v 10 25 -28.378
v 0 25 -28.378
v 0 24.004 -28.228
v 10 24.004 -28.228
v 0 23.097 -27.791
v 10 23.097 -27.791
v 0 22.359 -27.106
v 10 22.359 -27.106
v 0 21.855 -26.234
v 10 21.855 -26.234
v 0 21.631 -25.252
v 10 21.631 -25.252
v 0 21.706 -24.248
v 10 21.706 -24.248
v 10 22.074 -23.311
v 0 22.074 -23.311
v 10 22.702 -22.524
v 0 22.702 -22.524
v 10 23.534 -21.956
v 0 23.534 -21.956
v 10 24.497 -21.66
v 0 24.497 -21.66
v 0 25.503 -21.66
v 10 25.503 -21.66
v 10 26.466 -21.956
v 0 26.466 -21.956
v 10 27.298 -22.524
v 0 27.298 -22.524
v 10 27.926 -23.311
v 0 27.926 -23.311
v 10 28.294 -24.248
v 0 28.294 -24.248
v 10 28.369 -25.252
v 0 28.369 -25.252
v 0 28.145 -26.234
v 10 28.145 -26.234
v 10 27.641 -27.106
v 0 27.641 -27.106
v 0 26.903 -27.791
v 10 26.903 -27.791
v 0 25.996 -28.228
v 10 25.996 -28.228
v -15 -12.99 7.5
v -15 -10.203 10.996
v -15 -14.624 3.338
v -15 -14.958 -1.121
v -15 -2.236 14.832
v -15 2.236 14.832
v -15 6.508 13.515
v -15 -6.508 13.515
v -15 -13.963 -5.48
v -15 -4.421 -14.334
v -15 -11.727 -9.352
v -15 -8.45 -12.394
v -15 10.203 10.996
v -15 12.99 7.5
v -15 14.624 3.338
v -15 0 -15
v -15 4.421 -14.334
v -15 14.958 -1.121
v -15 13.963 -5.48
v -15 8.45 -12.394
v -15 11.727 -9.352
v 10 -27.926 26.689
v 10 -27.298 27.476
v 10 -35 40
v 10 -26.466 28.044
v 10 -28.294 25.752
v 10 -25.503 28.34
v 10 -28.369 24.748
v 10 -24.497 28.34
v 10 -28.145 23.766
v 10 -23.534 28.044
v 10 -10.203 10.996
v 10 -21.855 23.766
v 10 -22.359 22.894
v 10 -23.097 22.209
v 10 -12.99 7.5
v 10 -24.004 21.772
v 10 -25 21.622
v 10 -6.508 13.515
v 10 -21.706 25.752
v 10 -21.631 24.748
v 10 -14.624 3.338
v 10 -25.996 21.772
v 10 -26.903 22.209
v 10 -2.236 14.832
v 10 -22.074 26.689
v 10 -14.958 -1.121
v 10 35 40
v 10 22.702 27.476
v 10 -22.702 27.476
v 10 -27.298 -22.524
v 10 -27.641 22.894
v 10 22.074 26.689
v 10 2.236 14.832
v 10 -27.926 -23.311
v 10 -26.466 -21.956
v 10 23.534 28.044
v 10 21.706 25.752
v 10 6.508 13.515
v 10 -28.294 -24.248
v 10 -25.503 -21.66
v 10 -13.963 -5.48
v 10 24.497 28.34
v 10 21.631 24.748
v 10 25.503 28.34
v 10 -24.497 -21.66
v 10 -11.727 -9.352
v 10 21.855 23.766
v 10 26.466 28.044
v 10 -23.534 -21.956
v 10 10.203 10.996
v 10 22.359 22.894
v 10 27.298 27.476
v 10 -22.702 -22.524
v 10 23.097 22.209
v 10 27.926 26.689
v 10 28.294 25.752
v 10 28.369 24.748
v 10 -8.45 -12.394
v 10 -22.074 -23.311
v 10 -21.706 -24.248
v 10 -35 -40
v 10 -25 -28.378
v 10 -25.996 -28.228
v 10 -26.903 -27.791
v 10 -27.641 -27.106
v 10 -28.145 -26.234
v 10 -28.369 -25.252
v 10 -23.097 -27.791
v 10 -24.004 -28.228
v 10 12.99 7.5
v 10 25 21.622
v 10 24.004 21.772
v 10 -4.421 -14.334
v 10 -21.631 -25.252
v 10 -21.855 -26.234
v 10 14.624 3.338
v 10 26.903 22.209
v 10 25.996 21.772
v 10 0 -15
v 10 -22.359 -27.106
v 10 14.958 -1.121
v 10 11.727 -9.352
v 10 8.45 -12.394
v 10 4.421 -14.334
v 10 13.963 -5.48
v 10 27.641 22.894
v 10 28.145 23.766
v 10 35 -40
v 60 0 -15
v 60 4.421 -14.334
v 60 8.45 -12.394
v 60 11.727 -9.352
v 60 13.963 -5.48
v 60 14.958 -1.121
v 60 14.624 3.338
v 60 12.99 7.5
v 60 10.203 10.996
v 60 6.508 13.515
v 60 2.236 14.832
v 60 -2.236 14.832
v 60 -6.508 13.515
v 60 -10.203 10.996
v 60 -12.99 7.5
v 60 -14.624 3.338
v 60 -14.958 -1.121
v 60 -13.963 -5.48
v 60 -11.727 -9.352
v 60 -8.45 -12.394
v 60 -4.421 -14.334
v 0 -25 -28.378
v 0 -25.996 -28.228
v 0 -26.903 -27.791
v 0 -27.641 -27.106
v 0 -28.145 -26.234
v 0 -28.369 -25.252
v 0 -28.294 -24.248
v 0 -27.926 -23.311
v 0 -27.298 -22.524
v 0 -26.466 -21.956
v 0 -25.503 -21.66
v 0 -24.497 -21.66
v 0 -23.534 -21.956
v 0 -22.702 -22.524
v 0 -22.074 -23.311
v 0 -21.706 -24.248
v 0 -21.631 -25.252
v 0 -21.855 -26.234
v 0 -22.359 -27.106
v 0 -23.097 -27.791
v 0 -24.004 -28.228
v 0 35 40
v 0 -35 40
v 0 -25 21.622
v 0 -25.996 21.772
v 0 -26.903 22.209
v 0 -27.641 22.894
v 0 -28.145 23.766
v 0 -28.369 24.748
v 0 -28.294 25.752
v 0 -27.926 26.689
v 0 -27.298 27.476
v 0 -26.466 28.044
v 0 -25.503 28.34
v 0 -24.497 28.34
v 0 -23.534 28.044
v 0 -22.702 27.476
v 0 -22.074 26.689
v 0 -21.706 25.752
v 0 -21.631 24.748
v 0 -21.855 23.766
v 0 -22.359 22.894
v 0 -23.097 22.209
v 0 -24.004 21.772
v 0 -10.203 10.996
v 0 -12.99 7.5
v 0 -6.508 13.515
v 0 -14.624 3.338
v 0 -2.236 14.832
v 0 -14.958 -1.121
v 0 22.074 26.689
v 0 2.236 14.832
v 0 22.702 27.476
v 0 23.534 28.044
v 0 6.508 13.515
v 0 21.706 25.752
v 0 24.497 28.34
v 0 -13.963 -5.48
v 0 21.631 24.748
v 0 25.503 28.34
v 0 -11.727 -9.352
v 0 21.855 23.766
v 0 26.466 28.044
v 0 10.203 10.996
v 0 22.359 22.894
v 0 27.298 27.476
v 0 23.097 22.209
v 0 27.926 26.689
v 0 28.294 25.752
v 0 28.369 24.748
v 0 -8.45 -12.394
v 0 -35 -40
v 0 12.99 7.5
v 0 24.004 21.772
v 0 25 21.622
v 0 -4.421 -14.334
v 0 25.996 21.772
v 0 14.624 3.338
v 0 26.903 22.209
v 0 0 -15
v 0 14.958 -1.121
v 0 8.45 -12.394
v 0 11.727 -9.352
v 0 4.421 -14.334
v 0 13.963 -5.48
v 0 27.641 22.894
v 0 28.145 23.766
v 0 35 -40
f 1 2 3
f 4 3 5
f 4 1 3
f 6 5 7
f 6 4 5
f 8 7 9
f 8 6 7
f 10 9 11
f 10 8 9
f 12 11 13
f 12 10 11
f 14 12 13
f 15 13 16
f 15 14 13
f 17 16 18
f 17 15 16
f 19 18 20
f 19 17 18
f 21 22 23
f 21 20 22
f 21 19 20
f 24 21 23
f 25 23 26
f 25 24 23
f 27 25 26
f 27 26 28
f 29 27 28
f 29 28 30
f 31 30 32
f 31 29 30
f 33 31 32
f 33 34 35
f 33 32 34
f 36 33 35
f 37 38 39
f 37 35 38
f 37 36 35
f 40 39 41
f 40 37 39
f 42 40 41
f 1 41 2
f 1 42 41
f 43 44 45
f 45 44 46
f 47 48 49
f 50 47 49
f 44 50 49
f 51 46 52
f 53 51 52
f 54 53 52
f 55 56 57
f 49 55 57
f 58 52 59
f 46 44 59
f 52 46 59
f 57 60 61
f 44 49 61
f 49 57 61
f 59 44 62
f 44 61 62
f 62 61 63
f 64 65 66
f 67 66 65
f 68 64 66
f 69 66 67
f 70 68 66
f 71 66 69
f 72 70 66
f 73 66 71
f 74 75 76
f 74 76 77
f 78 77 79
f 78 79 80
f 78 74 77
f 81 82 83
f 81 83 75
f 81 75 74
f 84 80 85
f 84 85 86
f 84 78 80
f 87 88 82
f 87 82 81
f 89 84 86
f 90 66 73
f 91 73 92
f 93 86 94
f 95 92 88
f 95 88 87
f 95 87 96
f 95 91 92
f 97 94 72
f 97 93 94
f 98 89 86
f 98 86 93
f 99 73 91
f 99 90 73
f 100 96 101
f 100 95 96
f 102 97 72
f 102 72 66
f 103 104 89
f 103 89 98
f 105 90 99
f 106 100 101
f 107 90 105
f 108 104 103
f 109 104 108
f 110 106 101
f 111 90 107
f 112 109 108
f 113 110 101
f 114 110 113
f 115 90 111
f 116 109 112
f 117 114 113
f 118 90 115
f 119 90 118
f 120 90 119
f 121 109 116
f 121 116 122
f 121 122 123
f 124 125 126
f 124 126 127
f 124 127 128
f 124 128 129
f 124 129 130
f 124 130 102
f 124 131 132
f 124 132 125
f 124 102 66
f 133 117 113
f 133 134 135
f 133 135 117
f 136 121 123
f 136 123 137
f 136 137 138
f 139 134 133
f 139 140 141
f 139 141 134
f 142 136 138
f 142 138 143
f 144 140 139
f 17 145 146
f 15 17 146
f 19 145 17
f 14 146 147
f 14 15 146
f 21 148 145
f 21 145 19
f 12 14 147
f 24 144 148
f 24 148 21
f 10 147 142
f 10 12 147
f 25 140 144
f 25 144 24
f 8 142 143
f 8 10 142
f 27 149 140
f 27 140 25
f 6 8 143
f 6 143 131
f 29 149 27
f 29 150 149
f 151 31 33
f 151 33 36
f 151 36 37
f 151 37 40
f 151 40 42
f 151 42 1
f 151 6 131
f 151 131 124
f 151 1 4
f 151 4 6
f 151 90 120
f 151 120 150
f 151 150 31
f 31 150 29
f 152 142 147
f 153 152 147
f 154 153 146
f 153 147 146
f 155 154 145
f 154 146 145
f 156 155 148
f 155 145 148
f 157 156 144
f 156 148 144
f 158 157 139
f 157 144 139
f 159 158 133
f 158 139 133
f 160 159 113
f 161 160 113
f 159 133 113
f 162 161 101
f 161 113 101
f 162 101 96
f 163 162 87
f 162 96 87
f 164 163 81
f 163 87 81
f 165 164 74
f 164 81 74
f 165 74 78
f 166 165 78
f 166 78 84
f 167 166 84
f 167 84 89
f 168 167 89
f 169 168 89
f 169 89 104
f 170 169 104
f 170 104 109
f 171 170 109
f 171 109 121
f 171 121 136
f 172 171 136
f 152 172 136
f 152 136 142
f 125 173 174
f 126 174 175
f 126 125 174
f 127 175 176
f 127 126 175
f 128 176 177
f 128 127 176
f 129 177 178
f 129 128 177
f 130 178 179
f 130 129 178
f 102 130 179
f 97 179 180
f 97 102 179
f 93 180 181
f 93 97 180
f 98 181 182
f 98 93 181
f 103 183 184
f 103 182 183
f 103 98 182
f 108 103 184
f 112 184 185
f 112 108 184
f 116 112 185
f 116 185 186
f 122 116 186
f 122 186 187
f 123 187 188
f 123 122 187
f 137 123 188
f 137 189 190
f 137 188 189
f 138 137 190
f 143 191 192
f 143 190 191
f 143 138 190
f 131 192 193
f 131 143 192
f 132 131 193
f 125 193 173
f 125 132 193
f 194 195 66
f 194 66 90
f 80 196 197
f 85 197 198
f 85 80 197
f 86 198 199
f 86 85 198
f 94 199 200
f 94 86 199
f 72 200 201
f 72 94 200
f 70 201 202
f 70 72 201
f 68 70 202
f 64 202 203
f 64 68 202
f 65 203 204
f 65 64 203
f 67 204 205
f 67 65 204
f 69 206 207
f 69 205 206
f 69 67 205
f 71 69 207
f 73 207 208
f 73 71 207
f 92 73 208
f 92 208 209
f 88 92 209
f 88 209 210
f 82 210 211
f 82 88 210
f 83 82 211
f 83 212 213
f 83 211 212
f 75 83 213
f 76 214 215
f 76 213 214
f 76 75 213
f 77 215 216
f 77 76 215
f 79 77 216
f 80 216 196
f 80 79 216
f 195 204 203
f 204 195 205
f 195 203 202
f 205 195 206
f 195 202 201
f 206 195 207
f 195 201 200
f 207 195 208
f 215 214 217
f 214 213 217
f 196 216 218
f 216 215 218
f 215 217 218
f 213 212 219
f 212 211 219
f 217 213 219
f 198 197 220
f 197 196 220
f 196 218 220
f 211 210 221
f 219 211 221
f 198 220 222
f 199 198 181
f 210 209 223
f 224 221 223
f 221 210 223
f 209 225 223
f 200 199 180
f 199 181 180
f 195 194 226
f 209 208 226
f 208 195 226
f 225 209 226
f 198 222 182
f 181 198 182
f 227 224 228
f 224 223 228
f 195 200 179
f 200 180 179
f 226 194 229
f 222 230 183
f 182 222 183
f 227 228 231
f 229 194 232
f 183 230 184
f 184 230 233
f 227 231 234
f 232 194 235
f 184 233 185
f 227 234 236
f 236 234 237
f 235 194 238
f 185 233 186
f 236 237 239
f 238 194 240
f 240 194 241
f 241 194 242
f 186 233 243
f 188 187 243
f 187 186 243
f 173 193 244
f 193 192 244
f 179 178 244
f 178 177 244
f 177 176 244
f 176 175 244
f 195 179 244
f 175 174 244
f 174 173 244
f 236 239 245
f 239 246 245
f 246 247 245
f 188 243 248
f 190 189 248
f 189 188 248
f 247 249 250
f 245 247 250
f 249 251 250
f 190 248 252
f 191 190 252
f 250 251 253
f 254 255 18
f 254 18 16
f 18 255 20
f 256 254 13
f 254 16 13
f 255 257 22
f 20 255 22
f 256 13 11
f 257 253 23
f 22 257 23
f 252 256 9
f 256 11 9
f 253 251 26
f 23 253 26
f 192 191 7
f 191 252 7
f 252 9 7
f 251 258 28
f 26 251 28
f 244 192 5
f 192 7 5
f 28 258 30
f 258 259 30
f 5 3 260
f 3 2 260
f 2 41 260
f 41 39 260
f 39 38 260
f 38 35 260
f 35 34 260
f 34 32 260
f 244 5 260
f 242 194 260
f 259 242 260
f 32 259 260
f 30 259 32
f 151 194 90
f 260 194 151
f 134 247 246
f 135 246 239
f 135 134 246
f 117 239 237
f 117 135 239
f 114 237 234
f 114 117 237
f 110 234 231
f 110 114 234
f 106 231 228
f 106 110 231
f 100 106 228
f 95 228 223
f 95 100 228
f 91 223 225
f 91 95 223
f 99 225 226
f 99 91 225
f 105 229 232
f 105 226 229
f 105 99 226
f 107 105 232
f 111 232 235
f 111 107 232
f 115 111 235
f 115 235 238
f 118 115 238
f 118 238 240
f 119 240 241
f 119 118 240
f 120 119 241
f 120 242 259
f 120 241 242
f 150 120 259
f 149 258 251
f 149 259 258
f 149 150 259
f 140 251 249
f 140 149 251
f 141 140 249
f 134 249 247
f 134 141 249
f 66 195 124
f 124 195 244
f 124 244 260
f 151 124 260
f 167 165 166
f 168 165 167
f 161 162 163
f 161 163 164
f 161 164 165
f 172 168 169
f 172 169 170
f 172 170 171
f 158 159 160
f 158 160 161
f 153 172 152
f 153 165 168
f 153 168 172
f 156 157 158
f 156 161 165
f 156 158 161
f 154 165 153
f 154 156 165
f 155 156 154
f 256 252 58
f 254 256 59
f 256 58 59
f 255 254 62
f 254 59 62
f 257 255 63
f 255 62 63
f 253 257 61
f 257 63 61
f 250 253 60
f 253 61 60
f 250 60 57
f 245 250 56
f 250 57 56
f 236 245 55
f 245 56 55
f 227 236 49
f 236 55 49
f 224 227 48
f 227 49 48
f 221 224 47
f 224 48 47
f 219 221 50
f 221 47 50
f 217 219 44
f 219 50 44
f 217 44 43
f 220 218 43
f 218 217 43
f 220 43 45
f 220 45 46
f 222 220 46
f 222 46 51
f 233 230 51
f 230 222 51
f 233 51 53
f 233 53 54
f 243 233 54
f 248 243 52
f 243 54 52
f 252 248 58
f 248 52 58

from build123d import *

# Parameters (mm, degrees)
SKETCH1_W                = 80
SKETCH1_H                = 70
BOSS_EXTRUDE1_DEPTH      = 10
BOSS_EXTRUDE2_DEPTH      = 50
BOSS_EXTRUDE2_DEPTH_BACK = 25
SKETCH2_R                = 15
LPATTERN1_COUNT          = 2
LPATTERN1_PITCH          = 50
LPATTERN1_COUNT_DIR2     = 2
LPATTERN1_PITCH_DIR2     = 50


with BuildPart() as part:
    # Sketch1 → Boss-Extrude1 (new body)
    with BuildSketch(Plane(origin=(0, 0, 0), x_dir=(0, 0, -1), z_dir=(1, 0, 0))):
        Rectangle(SKETCH1_W, SKETCH1_H)
    extrude(amount=BOSS_EXTRUDE1_DEPTH)

    # Sketch2 → Boss-Extrude2 (add, two sides: drawn at the far end of the back side and taken through both)
    with BuildSketch(Plane(origin=(10, 0, 0), x_dir=(0, 0, -1), z_dir=(1, 0, 0)).offset(-BOSS_EXTRUDE2_DEPTH_BACK)):
        Circle(SKETCH2_R)
    extrude(amount=BOSS_EXTRUDE2_DEPTH + BOSS_EXTRUDE2_DEPTH_BACK)

    # Sketch4 → 1/4 Clearance Hole1 (revolve, cut)
    with BuildSketch(Plane(origin=(10, 25, 25), x_dir=(0, 0, -1), z_dir=(0, 1, 0))):
        Polygon((0, 0), (0, 31.239827343), (3.3782, 29.21), (3.3782, 0), align=None)
    f_1_4_clearance_hole1 = revolve(axis=Axis((16.35, 25, 25), (-1, 0, 0)), mode=Mode.SUBTRACT)

    # LPattern1: 1_4 Clearance Hole1 2 × 2
    with Locations(*[(0, -j * LPATTERN1_PITCH_DIR2, -i * LPATTERN1_PITCH) for i in range(LPATTERN1_COUNT) for j in range(LPATTERN1_COUNT_DIR2) if (i, j) != (0, 0)]):
        add(f_1_4_clearance_hole1, mode=Mode.SUBTRACT)


solid = part.part
